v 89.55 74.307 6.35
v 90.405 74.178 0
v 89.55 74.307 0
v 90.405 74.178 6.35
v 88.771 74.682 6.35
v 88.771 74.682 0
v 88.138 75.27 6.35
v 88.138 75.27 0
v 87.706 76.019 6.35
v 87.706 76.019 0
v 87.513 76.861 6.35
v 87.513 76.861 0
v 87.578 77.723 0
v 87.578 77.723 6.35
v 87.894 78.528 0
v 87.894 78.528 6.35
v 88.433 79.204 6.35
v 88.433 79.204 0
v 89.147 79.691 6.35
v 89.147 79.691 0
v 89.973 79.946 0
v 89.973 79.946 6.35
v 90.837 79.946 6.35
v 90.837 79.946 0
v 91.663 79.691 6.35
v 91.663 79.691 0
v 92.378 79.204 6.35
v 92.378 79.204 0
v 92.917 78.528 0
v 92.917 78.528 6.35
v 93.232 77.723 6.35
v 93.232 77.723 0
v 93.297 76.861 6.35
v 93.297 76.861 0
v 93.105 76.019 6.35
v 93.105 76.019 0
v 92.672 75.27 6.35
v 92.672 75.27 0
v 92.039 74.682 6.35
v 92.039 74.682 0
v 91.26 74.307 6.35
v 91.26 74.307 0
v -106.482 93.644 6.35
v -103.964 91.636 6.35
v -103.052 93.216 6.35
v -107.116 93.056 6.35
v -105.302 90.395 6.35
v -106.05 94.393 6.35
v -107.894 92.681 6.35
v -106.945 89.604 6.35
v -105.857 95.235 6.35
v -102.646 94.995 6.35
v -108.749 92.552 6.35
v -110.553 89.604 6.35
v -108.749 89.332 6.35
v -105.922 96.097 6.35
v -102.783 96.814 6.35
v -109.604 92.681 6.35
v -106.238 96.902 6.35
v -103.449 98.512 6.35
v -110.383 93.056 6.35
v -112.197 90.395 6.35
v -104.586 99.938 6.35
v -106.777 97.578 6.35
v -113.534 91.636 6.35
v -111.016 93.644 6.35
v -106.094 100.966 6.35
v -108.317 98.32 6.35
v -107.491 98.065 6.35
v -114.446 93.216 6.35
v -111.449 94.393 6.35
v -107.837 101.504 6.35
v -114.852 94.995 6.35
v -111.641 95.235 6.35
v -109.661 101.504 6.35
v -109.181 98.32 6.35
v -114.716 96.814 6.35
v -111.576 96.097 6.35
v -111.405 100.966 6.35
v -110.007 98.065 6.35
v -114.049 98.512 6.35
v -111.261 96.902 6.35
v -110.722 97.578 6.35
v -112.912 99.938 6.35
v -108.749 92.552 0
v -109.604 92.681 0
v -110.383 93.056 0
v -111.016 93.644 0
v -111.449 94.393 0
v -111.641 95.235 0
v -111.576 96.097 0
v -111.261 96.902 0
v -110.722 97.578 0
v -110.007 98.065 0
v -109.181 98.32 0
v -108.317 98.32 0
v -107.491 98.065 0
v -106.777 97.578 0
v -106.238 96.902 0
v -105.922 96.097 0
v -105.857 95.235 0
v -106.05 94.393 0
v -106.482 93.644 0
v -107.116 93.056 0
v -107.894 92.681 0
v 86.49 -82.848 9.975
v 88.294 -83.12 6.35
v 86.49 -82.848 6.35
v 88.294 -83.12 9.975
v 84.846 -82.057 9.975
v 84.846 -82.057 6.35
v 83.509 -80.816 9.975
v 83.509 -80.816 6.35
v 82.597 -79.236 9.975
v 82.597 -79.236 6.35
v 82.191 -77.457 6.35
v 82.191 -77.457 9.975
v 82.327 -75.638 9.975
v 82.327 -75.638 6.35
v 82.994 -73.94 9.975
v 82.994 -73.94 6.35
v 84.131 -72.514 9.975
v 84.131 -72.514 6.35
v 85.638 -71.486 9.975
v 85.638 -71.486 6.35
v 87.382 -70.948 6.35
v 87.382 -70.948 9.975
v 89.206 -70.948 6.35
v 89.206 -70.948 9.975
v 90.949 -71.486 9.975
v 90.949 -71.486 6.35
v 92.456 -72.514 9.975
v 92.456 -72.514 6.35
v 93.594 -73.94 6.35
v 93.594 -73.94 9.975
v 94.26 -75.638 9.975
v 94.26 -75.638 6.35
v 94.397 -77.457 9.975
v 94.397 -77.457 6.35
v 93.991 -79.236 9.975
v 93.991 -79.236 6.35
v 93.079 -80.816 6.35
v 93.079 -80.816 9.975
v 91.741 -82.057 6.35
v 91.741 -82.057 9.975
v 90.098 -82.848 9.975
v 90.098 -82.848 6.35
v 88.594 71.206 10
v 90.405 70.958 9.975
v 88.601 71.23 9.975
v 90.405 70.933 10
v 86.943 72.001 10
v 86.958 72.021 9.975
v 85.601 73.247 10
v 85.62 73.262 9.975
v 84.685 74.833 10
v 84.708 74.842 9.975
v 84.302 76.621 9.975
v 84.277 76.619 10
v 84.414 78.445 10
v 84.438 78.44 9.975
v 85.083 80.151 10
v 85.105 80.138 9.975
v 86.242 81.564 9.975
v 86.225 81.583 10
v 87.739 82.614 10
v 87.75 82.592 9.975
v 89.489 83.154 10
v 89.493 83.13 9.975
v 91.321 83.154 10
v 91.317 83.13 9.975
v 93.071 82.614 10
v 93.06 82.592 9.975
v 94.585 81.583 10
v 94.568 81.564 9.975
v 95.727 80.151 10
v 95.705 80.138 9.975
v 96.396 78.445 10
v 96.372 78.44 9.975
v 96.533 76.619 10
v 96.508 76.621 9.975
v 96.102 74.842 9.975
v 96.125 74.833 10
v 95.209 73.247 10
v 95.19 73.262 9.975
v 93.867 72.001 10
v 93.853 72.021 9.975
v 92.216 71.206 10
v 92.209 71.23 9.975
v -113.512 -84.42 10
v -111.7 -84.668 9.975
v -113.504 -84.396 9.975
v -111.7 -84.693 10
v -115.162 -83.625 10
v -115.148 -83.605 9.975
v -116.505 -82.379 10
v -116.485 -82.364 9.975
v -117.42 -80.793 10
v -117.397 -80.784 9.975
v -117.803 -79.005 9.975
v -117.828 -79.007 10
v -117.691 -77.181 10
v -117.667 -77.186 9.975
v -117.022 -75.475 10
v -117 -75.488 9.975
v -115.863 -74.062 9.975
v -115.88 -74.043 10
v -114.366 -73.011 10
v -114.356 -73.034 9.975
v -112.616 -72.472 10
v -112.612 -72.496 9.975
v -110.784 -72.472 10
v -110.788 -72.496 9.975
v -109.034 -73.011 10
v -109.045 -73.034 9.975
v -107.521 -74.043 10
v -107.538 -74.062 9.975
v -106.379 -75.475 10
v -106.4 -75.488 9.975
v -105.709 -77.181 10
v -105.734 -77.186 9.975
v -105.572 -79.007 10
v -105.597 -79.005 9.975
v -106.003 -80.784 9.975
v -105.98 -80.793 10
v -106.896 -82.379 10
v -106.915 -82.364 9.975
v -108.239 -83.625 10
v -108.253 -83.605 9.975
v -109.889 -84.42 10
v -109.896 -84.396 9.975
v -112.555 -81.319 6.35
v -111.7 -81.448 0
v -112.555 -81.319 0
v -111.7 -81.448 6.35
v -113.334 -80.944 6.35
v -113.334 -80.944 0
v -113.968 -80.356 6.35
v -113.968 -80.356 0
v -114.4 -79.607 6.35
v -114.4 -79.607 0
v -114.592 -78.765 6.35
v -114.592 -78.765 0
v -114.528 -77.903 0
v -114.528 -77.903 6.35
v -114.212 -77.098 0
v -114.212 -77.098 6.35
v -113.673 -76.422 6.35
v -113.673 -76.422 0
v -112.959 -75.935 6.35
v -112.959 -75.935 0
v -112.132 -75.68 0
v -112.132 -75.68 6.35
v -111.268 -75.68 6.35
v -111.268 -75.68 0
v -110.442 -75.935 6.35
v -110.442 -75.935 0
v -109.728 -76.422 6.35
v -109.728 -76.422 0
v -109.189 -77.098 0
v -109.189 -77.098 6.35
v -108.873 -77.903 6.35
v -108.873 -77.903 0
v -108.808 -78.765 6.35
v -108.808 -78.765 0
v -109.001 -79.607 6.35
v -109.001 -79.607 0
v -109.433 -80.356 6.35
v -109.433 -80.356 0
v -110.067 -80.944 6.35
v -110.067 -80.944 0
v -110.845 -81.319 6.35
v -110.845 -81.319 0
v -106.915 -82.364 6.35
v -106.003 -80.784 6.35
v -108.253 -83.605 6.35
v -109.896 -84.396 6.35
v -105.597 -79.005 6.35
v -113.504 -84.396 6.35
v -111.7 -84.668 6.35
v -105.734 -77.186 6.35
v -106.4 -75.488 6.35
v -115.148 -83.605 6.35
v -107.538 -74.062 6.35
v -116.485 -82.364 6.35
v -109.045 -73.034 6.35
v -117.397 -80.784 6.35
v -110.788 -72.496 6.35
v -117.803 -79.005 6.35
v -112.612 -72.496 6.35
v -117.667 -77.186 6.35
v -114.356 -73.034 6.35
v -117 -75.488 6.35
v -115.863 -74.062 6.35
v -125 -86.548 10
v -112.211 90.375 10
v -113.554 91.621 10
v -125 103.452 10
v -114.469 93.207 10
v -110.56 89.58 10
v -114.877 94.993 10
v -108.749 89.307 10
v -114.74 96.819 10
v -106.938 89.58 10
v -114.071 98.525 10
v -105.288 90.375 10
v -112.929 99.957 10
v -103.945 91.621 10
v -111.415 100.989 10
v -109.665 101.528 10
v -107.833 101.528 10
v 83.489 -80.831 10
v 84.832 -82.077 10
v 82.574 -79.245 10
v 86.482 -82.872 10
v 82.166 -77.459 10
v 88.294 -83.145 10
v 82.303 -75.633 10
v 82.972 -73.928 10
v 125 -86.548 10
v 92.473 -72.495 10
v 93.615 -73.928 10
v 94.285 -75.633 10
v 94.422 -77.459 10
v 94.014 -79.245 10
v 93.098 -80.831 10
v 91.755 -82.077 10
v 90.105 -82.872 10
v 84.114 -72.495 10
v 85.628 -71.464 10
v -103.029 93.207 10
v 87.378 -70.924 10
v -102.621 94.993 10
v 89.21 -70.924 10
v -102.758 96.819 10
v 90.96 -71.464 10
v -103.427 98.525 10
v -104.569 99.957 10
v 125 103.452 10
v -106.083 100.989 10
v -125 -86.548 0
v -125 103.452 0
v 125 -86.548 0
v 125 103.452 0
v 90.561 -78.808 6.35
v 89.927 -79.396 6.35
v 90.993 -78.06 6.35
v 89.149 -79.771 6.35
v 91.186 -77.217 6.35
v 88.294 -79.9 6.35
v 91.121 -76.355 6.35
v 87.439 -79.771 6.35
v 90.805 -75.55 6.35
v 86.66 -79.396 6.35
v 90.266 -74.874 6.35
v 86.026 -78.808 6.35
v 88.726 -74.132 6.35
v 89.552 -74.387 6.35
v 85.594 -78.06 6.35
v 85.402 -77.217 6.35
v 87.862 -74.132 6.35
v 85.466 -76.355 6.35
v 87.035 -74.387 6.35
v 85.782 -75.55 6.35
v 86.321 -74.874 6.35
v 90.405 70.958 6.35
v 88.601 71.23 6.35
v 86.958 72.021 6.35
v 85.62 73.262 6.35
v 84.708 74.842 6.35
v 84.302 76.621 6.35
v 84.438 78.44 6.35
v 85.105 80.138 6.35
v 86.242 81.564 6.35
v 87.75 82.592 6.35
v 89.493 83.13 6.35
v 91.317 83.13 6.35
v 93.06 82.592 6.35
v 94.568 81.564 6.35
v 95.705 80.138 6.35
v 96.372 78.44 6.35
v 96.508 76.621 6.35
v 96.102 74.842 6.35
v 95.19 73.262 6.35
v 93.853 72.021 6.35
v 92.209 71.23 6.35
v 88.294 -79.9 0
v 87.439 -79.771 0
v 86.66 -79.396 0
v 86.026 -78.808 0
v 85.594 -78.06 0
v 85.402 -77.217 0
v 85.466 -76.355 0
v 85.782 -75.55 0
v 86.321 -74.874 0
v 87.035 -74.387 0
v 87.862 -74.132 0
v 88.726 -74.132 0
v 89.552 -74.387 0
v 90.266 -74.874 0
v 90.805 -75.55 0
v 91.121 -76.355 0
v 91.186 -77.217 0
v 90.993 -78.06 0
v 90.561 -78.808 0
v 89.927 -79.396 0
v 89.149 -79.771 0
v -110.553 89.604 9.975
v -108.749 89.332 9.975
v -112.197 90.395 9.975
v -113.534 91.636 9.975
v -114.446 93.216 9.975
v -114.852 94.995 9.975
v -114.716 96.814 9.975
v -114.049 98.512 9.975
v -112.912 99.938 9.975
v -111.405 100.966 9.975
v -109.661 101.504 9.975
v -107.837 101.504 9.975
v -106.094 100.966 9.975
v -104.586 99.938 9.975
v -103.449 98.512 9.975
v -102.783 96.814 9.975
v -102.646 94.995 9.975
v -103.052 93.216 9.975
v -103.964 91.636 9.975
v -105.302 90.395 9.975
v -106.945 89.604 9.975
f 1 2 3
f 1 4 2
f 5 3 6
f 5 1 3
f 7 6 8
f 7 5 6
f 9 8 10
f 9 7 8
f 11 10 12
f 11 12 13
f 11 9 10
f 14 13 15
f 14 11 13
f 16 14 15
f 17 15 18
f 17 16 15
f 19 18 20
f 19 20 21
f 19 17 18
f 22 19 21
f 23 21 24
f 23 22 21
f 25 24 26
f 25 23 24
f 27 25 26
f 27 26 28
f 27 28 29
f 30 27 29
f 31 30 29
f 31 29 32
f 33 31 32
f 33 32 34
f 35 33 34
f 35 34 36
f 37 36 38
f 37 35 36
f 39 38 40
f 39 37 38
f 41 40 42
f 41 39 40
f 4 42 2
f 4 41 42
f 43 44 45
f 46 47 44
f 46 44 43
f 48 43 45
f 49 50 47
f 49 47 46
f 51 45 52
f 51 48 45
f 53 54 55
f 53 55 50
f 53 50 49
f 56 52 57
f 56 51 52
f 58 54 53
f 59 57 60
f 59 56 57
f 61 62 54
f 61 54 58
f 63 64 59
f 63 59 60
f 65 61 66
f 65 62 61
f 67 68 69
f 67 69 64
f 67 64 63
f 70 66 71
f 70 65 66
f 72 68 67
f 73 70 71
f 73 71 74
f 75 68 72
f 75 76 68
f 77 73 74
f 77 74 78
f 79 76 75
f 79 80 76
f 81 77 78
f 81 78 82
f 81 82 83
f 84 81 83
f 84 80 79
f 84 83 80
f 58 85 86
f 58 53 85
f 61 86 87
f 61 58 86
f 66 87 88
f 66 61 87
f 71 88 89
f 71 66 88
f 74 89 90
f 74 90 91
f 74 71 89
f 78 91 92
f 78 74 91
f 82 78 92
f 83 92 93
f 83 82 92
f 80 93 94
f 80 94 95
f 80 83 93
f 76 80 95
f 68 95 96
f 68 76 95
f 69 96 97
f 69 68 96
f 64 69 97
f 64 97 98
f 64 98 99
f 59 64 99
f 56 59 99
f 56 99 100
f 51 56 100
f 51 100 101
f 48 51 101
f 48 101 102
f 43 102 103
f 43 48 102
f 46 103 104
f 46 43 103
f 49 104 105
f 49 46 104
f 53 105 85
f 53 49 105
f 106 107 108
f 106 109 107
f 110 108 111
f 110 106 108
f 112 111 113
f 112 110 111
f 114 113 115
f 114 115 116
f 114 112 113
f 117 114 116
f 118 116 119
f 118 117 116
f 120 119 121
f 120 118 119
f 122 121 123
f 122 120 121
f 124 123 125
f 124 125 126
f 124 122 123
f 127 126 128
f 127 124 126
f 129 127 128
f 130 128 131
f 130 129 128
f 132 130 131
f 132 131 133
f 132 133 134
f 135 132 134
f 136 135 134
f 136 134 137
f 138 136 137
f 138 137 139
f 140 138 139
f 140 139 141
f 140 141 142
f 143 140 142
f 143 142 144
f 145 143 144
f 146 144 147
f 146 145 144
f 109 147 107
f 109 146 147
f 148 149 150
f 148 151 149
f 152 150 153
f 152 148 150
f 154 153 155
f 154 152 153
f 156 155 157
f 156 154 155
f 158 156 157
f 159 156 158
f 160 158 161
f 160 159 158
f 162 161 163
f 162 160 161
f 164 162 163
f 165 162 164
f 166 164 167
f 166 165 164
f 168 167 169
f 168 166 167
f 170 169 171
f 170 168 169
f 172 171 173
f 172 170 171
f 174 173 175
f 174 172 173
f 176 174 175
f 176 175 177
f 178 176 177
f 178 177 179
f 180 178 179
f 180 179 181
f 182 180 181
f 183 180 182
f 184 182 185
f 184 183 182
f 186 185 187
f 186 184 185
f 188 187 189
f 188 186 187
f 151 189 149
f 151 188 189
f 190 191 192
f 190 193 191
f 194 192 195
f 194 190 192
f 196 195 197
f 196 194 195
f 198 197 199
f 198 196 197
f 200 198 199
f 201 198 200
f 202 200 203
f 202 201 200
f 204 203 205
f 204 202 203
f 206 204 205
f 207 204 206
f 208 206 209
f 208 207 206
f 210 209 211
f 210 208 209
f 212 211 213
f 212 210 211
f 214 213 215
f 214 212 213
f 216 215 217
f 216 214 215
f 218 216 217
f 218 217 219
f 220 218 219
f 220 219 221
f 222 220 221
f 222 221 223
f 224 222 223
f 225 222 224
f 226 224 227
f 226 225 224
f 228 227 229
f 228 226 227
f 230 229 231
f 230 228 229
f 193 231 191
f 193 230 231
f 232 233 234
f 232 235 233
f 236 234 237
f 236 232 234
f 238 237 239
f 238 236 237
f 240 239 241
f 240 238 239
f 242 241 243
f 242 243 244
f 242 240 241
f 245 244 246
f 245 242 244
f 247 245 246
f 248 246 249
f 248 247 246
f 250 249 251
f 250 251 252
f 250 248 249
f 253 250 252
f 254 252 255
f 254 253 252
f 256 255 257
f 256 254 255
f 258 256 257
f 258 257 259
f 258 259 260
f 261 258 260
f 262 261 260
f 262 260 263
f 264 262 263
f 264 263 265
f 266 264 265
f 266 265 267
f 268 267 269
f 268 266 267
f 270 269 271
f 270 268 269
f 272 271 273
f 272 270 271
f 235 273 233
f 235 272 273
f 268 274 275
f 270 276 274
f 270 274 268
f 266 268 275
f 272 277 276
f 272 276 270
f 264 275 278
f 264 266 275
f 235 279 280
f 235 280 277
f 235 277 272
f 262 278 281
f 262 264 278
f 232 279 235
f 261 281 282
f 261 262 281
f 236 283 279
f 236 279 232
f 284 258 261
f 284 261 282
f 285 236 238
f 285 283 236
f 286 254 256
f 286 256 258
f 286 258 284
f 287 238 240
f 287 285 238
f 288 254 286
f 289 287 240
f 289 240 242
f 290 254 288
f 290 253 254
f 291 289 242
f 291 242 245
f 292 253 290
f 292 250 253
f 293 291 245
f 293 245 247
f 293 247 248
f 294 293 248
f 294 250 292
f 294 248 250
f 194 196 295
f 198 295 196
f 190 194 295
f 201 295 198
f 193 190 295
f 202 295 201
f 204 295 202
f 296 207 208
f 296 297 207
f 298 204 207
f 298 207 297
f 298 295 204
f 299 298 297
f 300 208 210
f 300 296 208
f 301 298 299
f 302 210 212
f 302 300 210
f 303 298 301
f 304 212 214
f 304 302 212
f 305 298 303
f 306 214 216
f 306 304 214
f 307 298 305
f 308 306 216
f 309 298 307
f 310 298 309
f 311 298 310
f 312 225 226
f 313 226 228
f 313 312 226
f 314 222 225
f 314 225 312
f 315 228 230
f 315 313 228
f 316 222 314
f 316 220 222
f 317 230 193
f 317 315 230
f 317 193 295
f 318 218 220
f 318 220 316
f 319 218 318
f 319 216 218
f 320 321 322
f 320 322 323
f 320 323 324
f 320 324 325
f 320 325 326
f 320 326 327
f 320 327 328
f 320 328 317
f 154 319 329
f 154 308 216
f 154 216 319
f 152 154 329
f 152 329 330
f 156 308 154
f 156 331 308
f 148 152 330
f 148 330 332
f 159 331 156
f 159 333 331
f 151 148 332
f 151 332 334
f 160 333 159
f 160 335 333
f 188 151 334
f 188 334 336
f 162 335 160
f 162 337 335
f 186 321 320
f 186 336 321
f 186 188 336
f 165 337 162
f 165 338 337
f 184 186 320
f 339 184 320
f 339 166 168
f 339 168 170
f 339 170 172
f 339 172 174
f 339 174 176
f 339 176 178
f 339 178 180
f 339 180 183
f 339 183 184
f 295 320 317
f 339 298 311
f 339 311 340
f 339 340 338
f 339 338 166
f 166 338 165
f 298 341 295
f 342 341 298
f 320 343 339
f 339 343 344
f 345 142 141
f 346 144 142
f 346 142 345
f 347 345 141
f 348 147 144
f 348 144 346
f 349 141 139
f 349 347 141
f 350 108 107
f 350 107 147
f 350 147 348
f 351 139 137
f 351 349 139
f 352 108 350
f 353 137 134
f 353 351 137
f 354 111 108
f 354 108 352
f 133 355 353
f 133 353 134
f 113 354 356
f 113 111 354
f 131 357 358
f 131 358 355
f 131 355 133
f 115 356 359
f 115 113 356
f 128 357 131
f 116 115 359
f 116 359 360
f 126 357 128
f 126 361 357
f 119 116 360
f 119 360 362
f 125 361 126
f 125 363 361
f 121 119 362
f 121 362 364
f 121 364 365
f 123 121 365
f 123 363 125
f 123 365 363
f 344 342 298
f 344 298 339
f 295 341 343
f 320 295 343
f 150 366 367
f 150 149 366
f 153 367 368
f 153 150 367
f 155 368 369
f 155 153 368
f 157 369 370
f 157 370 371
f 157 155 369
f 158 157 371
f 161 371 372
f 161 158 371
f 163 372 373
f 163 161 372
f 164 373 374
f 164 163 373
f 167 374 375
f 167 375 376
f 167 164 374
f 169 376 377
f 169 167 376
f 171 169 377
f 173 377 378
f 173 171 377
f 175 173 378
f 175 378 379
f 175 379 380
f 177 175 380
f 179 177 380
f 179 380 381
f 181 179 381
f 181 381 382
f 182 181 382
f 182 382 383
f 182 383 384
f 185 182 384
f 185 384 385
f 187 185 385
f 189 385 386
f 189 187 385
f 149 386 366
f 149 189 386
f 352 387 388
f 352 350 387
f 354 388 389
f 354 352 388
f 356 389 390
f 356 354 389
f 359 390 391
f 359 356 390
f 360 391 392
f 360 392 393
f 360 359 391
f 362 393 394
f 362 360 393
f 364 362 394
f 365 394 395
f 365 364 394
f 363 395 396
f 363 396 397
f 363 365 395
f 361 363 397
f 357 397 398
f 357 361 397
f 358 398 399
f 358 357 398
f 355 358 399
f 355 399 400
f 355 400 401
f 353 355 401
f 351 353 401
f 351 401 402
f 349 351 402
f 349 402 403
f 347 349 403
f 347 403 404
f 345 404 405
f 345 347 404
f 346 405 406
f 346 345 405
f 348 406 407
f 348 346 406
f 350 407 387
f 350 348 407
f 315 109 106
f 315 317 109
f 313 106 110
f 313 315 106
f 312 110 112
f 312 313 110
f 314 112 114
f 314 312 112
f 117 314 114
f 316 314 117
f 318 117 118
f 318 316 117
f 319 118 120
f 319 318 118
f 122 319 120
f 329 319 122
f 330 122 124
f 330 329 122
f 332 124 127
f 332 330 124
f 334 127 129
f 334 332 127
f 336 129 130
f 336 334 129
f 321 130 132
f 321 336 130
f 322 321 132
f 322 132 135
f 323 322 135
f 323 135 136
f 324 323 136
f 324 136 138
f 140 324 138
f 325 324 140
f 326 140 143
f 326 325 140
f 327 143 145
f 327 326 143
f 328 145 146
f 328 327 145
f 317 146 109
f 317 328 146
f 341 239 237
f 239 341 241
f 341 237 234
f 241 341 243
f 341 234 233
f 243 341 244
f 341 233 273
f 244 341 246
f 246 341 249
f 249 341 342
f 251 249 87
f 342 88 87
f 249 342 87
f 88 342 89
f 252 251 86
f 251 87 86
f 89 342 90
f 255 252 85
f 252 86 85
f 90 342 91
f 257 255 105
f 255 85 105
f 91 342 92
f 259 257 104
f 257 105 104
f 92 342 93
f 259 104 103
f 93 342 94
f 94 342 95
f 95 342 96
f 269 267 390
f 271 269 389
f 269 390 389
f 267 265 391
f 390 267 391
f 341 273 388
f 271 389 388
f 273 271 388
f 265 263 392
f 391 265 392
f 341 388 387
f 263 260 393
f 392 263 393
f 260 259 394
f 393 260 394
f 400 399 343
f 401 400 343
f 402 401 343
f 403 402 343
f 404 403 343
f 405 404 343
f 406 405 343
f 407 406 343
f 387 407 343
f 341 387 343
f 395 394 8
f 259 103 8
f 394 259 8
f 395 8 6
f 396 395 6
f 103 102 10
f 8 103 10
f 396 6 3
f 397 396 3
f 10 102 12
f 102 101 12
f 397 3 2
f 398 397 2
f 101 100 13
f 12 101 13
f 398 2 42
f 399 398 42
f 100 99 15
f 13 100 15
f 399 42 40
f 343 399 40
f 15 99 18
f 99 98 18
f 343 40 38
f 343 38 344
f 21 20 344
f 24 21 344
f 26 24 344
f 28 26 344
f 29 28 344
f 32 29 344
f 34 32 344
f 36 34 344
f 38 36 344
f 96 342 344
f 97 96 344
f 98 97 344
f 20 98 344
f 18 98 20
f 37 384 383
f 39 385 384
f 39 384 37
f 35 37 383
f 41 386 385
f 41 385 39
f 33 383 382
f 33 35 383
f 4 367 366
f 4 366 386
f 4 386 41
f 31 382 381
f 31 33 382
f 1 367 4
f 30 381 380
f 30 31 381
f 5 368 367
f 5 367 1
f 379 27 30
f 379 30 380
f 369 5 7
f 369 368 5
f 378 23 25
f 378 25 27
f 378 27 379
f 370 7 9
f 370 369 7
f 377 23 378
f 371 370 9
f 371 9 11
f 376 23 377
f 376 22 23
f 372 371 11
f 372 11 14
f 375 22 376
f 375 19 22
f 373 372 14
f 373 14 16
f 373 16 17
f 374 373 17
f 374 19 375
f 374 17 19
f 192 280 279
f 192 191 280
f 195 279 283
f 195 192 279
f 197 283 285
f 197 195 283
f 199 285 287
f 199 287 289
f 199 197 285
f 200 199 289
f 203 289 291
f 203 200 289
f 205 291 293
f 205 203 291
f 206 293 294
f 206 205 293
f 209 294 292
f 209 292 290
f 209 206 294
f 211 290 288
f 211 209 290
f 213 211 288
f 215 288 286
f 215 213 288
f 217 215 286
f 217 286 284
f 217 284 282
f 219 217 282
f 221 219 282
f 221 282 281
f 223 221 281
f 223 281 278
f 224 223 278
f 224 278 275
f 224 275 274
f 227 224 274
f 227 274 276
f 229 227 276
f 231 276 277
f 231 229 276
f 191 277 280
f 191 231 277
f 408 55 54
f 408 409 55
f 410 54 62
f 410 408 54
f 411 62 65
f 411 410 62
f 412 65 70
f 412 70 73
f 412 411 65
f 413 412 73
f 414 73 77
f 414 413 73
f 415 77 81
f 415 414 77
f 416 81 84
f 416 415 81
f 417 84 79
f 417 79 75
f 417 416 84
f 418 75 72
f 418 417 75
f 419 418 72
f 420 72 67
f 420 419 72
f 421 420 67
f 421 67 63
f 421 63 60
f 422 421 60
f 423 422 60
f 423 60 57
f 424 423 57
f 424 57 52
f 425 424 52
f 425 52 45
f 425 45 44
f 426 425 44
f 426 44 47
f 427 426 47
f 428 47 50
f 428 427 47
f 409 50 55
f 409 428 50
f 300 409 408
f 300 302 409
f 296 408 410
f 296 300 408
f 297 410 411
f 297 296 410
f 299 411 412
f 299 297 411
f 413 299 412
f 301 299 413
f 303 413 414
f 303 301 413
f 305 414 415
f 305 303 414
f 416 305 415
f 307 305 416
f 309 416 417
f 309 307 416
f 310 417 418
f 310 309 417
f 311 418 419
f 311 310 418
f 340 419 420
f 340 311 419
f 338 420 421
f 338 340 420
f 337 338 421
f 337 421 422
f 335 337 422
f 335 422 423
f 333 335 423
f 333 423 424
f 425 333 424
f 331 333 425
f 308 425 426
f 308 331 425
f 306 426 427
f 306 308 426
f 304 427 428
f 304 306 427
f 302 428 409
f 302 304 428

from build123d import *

# Parameters (mm, degrees)
SKETCH1_W                                   = 250
SKETCH1_H                                   = 190
BOSS_EXTRUDE1_DEPTH                         = 10
CBORE_FOR_M5_HEX_HEAD_CAP_SCREW1_AT_2_COUNT = 2
CBORE_FOR_M5_HEX_HEAD_CAP_SCREW1_AT_2_PITCH = 174.025024549
CBORE_FOR_M5_HEX_HEAD_CAP_SCREW1_AT_3_COUNT = 2
CBORE_FOR_M5_HEX_HEAD_CAP_SCREW1_AT_3_PITCH = 261.850395634
CBORE_FOR_M5_HEX_HEAD_CAP_SCREW1_AT_4_COUNT = 2
CBORE_FOR_M5_HEX_HEAD_CAP_SCREW1_AT_4_PITCH = 200


with BuildPart() as part:
    # Sketch1 → Boss-Extrude1 (new body)
    with BuildSketch(Plane.XY):
        with Locations((0, 8.452072107)):
            Rectangle(SKETCH1_W, SKETCH1_H)
    extrude(amount=BOSS_EXTRUDE1_DEPTH)

    # Sketch10 → CBORE for M5 Hex Head Cap Screw1 (revolve, cut)
    with BuildSketch(Plane(origin=(-108.749145678, 95.452072107, 10), x_dir=(0, -1, 0), z_dir=(1, 0, 0))):
        Polygon((0, 0), (0, 10), (2.9, 10), (2.9, 3.65), (6.12, 3.65), (6.12, 0.025), (6.145, 0), align=None)
    cbore_for_m5_hex_head_cap_screw1 = revolve(axis=Axis((-108.749145678, 95.452072107, 16.35), (0, 0, -1)), mode=Mode.SUBTRACT)

    # CBORE for M5 Hex Head Cap Screw1 at 2: CBORE for M5 Hex Head Cap Screw1 ×2
    with Locations(*[Vector(-0.01695807915079003, -0.9998562014367444, 0) * (i * CBORE_FOR_M5_HEX_HEAD_CAP_SCREW1_AT_2_PITCH) for i in range(1, CBORE_FOR_M5_HEX_HEAD_CAP_SCREW1_AT_2_COUNT)]):
        add(cbore_for_m5_hex_head_cap_screw1, mode=Mode.SUBTRACT)

    # CBORE for M5 Hex Head Cap Screw1 at 3: CBORE for M5 Hex Head Cap Screw1 ×2
    with Locations(*[Vector(0.7525017460823102, -0.6585902536046783, 0) * (i * CBORE_FOR_M5_HEX_HEAD_CAP_SCREW1_AT_3_PITCH) for i in range(1, CBORE_FOR_M5_HEX_HEAD_CAP_SCREW1_AT_3_COUNT)]):
        add(cbore_for_m5_hex_head_cap_screw1, mode=Mode.SUBTRACT)

    # CBORE for M5 Hex Head Cap Screw1 at 4: CBORE for M5 Hex Head Cap Screw1 ×2
    with Locations(*[Vector(0.9957709917740633, -0.09187019071112518, 0) * (i * CBORE_FOR_M5_HEX_HEAD_CAP_SCREW1_AT_4_PITCH) for i in range(1, CBORE_FOR_M5_HEX_HEAD_CAP_SCREW1_AT_4_COUNT)]):
        add(cbore_for_m5_hex_head_cap_screw1, mode=Mode.SUBTRACT)


solid = part.part
